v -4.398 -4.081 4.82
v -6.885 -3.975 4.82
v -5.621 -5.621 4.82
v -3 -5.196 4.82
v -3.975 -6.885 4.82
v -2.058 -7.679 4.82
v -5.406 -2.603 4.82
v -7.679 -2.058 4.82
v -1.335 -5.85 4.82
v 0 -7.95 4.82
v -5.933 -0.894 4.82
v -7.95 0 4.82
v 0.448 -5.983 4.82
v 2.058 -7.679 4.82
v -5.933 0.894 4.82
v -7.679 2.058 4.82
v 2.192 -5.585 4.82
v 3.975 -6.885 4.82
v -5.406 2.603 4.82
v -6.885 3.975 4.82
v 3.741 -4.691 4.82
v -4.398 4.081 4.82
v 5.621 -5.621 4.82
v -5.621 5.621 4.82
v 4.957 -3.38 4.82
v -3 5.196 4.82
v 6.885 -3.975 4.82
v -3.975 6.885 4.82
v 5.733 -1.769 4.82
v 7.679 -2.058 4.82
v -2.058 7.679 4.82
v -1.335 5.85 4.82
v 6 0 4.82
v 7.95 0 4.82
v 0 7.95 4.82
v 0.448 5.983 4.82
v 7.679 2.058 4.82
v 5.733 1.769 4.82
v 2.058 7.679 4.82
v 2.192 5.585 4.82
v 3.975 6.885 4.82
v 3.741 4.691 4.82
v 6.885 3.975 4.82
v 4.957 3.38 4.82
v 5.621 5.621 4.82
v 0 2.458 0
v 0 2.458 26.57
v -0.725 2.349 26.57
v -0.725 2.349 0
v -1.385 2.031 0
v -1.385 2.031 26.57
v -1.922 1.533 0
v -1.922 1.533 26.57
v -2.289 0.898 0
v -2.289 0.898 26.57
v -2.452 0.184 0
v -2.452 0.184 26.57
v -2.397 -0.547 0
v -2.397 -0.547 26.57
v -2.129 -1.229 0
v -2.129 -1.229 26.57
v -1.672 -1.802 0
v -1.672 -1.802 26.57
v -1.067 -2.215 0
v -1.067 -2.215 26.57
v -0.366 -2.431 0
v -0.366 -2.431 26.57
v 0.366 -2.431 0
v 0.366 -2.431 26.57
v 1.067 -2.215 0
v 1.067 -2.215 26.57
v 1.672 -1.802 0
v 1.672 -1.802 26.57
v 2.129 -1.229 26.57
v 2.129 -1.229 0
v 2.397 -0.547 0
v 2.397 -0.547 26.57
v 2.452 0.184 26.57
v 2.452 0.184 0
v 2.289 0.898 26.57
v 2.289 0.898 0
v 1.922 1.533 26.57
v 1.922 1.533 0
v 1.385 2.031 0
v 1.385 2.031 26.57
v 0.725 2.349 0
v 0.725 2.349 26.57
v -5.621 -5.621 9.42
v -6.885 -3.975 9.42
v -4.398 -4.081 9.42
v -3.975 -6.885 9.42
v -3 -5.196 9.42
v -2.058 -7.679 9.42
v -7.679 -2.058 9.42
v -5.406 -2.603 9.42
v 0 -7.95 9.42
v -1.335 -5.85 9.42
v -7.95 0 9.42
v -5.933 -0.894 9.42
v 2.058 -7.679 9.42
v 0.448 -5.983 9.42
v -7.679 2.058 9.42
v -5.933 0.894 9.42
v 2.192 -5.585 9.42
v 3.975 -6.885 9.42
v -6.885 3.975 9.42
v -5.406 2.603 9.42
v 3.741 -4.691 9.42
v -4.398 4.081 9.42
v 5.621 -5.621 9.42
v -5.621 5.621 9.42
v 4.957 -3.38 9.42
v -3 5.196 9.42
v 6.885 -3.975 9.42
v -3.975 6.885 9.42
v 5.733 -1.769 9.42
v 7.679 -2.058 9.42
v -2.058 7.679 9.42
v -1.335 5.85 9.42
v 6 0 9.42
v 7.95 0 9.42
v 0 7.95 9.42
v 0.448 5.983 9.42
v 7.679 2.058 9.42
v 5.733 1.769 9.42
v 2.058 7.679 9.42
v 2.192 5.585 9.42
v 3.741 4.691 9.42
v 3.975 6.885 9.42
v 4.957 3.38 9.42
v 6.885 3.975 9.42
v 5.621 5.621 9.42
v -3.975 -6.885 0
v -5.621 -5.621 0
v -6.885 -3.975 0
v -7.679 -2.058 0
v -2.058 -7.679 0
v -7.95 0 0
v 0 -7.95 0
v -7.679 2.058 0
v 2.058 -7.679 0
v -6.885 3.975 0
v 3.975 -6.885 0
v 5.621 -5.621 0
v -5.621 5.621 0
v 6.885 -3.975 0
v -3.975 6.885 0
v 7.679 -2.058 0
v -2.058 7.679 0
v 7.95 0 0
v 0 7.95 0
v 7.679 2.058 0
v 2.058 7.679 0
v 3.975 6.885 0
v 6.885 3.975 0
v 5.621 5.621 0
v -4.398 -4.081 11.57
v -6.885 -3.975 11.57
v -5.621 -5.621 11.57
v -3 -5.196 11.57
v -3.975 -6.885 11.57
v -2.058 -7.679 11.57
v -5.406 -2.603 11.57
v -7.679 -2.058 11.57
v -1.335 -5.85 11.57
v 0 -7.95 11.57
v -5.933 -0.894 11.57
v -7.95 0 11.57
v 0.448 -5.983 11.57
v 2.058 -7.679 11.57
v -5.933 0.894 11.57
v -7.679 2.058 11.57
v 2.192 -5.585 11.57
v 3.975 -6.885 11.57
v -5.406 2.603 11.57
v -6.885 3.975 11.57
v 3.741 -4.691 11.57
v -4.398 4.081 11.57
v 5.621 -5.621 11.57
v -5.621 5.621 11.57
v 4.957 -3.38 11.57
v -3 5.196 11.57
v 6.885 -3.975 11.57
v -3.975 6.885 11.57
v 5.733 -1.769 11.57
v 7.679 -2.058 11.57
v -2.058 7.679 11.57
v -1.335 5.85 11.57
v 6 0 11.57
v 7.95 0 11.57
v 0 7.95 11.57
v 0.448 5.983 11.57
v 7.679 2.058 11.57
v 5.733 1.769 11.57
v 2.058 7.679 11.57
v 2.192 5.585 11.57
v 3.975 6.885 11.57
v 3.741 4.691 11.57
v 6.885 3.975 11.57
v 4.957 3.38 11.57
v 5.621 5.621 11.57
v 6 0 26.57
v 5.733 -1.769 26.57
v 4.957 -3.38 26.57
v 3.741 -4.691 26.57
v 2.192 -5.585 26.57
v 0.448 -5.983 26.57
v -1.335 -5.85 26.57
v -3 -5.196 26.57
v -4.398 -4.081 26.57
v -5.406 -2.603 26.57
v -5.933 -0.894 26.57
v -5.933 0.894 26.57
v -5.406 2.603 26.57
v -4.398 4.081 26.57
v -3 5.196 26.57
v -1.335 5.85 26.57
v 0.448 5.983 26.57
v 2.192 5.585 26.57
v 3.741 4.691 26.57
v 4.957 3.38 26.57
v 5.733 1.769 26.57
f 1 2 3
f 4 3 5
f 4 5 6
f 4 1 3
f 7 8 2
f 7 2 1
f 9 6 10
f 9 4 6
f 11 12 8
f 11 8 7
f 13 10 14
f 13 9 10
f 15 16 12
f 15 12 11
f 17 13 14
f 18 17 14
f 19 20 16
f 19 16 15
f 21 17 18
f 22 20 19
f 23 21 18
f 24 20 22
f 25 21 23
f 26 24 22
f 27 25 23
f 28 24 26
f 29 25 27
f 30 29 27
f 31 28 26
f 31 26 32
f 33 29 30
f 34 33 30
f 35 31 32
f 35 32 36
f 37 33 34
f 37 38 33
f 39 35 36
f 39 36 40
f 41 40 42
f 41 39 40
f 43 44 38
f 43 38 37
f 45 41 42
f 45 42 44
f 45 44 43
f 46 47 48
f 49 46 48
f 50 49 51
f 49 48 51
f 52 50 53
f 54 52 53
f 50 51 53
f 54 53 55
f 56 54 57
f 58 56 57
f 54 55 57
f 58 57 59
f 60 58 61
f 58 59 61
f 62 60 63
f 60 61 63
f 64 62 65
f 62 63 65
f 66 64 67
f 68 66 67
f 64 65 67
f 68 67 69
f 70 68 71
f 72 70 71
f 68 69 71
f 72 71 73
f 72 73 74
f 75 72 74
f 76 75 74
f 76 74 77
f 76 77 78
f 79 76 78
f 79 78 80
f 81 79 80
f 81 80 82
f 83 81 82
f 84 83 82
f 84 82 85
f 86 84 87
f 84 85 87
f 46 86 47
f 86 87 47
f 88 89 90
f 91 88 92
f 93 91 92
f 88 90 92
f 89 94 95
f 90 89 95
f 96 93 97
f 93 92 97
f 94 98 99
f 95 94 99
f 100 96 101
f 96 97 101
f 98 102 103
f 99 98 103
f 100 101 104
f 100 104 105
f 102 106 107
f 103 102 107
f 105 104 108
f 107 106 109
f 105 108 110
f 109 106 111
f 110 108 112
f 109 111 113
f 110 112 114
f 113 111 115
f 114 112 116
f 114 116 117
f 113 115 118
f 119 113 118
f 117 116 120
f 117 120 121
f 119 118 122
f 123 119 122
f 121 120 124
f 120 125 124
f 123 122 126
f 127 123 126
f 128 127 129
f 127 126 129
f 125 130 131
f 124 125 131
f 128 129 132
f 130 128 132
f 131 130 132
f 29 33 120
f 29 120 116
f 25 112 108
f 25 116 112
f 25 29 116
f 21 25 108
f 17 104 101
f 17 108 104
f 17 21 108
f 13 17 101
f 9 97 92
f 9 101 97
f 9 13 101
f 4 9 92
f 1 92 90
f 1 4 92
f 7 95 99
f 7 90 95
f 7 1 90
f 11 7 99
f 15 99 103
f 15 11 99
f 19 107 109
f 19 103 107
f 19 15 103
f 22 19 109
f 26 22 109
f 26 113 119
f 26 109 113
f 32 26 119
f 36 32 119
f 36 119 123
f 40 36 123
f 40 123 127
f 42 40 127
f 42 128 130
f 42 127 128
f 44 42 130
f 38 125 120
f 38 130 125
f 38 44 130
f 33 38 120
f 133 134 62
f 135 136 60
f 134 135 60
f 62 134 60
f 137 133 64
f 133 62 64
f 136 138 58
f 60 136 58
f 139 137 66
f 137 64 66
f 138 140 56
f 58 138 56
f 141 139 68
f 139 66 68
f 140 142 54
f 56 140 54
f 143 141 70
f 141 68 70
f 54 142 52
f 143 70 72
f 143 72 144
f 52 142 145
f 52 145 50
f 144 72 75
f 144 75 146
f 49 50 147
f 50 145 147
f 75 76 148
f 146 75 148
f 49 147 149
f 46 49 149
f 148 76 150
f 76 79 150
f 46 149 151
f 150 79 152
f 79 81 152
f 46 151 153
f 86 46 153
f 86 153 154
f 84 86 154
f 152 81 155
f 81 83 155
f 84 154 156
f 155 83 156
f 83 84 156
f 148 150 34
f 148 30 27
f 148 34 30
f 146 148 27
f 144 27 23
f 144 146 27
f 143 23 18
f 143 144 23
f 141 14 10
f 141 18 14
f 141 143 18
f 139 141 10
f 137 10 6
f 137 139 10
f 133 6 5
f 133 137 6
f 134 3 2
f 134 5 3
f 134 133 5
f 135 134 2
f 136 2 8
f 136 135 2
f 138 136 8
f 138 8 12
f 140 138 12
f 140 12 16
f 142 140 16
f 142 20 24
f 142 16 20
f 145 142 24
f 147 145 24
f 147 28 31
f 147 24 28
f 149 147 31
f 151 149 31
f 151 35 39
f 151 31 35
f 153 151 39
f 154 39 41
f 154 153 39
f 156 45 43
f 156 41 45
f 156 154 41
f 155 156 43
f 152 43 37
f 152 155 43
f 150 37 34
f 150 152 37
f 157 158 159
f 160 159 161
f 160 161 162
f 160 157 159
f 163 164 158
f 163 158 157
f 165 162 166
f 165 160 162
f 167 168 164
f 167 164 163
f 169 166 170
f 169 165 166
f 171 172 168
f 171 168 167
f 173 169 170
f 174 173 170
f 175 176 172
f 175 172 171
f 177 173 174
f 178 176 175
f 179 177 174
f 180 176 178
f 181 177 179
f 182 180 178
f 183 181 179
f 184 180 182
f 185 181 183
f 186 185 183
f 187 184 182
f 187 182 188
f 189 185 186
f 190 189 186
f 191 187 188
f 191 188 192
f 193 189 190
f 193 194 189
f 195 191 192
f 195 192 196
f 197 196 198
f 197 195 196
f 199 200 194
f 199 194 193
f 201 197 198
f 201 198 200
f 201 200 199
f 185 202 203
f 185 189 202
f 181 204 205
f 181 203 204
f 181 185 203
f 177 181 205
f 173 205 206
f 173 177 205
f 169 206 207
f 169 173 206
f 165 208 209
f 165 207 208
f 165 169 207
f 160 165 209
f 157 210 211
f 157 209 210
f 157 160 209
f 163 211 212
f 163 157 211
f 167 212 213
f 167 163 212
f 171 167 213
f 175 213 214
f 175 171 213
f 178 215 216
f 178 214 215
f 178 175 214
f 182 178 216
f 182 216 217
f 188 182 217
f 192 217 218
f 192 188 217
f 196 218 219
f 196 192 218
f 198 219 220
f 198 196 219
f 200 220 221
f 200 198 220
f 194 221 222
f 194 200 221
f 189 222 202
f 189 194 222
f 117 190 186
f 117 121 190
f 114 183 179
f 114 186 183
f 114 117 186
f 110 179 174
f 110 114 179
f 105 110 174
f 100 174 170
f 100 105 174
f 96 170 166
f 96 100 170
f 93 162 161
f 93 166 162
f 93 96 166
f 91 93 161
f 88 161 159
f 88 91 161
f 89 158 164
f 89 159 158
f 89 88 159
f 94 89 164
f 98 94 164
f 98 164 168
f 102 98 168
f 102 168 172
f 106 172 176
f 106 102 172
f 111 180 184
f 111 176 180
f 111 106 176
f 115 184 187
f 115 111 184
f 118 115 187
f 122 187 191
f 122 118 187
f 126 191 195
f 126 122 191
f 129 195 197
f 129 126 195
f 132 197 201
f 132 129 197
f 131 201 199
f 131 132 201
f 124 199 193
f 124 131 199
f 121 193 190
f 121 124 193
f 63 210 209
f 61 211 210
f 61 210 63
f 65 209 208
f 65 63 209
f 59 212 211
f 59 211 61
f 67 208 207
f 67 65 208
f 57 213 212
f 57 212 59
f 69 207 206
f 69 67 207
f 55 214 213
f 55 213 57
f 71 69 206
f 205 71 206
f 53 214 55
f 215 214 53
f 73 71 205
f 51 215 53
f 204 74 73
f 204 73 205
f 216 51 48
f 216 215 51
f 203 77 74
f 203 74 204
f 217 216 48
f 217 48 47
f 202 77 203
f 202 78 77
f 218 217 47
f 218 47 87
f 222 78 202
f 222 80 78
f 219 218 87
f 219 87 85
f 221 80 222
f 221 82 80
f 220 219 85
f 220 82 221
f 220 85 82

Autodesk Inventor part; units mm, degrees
ref_plane "YZ Plane" through (0, 0, 0) normal (1, 0, 0) x (0, 1, 0)
ref_plane "XZ Plane" through (0, 0, 0) normal (0, 1, 0) x (-1, 0, 0)
ref_plane "XY Plane" through (0, 0, 0) normal (0, 0, 1) x (1, 0, 0)
sketch "Sketch1" plane through (0, 0, 0) normal (0, 0, 1) x (1, 0, 0)
  circle A0 centre (0, 0) radius 7.95
  dimension "d0" = 15.9
extrude "Extrusion1" add sketch "Sketch1" along normal blind 4.82
sketch "Sketch2" plane through (0, 0, 4.82) normal (0, 0, 1) x (1, 0, 0)
  circle A0 centre (0, 0) radius 7.95 projected
  circle A1 centre (0, 0) radius 6
  dimension "d3" = 12
extrude "Extrusion2" add sketch "Sketch2" along normal blind 4.6 contours A1
sketch "Sketch3" plane through (0, 0, 9.42) normal (0, 0, 1) x (1, 0, 0)
  circle A0 centre (0, 0) radius 6 projected
  circle A1 centre (0, 0) radius 7.95
  circle A2 centre (0, 0) radius 7.95 projected
extrude "Extrusion3" add sketch "Sketch3" along normal blind 2.15 contours A0 | A1
sketch "Sketch4" plane through (0, 0, 11.57) normal (0, 0, 1) x (1, 0, 0)
  circle A0 centre (0, 0) radius 7.95 projected
  circle A1 centre (0, 0) radius 6
  dimension "d8" = 12
extrude "Extrusion4" add sketch "Sketch4" along normal blind 15 contours A1
sketch "Sketch5" plane through (0, 0, 0) normal (0, 0, -1) x (-1, 0, 0)
  circle A0 centre (0, 0) radius 7.95 projected
hole "Hole1" at (0, 0, 0) direction (0, 0, 1) diameter 4.917 end through all thread size "M6x1" class "6H" standard "ANSI Metric M Profile"
properties part number "peek-insulator"
